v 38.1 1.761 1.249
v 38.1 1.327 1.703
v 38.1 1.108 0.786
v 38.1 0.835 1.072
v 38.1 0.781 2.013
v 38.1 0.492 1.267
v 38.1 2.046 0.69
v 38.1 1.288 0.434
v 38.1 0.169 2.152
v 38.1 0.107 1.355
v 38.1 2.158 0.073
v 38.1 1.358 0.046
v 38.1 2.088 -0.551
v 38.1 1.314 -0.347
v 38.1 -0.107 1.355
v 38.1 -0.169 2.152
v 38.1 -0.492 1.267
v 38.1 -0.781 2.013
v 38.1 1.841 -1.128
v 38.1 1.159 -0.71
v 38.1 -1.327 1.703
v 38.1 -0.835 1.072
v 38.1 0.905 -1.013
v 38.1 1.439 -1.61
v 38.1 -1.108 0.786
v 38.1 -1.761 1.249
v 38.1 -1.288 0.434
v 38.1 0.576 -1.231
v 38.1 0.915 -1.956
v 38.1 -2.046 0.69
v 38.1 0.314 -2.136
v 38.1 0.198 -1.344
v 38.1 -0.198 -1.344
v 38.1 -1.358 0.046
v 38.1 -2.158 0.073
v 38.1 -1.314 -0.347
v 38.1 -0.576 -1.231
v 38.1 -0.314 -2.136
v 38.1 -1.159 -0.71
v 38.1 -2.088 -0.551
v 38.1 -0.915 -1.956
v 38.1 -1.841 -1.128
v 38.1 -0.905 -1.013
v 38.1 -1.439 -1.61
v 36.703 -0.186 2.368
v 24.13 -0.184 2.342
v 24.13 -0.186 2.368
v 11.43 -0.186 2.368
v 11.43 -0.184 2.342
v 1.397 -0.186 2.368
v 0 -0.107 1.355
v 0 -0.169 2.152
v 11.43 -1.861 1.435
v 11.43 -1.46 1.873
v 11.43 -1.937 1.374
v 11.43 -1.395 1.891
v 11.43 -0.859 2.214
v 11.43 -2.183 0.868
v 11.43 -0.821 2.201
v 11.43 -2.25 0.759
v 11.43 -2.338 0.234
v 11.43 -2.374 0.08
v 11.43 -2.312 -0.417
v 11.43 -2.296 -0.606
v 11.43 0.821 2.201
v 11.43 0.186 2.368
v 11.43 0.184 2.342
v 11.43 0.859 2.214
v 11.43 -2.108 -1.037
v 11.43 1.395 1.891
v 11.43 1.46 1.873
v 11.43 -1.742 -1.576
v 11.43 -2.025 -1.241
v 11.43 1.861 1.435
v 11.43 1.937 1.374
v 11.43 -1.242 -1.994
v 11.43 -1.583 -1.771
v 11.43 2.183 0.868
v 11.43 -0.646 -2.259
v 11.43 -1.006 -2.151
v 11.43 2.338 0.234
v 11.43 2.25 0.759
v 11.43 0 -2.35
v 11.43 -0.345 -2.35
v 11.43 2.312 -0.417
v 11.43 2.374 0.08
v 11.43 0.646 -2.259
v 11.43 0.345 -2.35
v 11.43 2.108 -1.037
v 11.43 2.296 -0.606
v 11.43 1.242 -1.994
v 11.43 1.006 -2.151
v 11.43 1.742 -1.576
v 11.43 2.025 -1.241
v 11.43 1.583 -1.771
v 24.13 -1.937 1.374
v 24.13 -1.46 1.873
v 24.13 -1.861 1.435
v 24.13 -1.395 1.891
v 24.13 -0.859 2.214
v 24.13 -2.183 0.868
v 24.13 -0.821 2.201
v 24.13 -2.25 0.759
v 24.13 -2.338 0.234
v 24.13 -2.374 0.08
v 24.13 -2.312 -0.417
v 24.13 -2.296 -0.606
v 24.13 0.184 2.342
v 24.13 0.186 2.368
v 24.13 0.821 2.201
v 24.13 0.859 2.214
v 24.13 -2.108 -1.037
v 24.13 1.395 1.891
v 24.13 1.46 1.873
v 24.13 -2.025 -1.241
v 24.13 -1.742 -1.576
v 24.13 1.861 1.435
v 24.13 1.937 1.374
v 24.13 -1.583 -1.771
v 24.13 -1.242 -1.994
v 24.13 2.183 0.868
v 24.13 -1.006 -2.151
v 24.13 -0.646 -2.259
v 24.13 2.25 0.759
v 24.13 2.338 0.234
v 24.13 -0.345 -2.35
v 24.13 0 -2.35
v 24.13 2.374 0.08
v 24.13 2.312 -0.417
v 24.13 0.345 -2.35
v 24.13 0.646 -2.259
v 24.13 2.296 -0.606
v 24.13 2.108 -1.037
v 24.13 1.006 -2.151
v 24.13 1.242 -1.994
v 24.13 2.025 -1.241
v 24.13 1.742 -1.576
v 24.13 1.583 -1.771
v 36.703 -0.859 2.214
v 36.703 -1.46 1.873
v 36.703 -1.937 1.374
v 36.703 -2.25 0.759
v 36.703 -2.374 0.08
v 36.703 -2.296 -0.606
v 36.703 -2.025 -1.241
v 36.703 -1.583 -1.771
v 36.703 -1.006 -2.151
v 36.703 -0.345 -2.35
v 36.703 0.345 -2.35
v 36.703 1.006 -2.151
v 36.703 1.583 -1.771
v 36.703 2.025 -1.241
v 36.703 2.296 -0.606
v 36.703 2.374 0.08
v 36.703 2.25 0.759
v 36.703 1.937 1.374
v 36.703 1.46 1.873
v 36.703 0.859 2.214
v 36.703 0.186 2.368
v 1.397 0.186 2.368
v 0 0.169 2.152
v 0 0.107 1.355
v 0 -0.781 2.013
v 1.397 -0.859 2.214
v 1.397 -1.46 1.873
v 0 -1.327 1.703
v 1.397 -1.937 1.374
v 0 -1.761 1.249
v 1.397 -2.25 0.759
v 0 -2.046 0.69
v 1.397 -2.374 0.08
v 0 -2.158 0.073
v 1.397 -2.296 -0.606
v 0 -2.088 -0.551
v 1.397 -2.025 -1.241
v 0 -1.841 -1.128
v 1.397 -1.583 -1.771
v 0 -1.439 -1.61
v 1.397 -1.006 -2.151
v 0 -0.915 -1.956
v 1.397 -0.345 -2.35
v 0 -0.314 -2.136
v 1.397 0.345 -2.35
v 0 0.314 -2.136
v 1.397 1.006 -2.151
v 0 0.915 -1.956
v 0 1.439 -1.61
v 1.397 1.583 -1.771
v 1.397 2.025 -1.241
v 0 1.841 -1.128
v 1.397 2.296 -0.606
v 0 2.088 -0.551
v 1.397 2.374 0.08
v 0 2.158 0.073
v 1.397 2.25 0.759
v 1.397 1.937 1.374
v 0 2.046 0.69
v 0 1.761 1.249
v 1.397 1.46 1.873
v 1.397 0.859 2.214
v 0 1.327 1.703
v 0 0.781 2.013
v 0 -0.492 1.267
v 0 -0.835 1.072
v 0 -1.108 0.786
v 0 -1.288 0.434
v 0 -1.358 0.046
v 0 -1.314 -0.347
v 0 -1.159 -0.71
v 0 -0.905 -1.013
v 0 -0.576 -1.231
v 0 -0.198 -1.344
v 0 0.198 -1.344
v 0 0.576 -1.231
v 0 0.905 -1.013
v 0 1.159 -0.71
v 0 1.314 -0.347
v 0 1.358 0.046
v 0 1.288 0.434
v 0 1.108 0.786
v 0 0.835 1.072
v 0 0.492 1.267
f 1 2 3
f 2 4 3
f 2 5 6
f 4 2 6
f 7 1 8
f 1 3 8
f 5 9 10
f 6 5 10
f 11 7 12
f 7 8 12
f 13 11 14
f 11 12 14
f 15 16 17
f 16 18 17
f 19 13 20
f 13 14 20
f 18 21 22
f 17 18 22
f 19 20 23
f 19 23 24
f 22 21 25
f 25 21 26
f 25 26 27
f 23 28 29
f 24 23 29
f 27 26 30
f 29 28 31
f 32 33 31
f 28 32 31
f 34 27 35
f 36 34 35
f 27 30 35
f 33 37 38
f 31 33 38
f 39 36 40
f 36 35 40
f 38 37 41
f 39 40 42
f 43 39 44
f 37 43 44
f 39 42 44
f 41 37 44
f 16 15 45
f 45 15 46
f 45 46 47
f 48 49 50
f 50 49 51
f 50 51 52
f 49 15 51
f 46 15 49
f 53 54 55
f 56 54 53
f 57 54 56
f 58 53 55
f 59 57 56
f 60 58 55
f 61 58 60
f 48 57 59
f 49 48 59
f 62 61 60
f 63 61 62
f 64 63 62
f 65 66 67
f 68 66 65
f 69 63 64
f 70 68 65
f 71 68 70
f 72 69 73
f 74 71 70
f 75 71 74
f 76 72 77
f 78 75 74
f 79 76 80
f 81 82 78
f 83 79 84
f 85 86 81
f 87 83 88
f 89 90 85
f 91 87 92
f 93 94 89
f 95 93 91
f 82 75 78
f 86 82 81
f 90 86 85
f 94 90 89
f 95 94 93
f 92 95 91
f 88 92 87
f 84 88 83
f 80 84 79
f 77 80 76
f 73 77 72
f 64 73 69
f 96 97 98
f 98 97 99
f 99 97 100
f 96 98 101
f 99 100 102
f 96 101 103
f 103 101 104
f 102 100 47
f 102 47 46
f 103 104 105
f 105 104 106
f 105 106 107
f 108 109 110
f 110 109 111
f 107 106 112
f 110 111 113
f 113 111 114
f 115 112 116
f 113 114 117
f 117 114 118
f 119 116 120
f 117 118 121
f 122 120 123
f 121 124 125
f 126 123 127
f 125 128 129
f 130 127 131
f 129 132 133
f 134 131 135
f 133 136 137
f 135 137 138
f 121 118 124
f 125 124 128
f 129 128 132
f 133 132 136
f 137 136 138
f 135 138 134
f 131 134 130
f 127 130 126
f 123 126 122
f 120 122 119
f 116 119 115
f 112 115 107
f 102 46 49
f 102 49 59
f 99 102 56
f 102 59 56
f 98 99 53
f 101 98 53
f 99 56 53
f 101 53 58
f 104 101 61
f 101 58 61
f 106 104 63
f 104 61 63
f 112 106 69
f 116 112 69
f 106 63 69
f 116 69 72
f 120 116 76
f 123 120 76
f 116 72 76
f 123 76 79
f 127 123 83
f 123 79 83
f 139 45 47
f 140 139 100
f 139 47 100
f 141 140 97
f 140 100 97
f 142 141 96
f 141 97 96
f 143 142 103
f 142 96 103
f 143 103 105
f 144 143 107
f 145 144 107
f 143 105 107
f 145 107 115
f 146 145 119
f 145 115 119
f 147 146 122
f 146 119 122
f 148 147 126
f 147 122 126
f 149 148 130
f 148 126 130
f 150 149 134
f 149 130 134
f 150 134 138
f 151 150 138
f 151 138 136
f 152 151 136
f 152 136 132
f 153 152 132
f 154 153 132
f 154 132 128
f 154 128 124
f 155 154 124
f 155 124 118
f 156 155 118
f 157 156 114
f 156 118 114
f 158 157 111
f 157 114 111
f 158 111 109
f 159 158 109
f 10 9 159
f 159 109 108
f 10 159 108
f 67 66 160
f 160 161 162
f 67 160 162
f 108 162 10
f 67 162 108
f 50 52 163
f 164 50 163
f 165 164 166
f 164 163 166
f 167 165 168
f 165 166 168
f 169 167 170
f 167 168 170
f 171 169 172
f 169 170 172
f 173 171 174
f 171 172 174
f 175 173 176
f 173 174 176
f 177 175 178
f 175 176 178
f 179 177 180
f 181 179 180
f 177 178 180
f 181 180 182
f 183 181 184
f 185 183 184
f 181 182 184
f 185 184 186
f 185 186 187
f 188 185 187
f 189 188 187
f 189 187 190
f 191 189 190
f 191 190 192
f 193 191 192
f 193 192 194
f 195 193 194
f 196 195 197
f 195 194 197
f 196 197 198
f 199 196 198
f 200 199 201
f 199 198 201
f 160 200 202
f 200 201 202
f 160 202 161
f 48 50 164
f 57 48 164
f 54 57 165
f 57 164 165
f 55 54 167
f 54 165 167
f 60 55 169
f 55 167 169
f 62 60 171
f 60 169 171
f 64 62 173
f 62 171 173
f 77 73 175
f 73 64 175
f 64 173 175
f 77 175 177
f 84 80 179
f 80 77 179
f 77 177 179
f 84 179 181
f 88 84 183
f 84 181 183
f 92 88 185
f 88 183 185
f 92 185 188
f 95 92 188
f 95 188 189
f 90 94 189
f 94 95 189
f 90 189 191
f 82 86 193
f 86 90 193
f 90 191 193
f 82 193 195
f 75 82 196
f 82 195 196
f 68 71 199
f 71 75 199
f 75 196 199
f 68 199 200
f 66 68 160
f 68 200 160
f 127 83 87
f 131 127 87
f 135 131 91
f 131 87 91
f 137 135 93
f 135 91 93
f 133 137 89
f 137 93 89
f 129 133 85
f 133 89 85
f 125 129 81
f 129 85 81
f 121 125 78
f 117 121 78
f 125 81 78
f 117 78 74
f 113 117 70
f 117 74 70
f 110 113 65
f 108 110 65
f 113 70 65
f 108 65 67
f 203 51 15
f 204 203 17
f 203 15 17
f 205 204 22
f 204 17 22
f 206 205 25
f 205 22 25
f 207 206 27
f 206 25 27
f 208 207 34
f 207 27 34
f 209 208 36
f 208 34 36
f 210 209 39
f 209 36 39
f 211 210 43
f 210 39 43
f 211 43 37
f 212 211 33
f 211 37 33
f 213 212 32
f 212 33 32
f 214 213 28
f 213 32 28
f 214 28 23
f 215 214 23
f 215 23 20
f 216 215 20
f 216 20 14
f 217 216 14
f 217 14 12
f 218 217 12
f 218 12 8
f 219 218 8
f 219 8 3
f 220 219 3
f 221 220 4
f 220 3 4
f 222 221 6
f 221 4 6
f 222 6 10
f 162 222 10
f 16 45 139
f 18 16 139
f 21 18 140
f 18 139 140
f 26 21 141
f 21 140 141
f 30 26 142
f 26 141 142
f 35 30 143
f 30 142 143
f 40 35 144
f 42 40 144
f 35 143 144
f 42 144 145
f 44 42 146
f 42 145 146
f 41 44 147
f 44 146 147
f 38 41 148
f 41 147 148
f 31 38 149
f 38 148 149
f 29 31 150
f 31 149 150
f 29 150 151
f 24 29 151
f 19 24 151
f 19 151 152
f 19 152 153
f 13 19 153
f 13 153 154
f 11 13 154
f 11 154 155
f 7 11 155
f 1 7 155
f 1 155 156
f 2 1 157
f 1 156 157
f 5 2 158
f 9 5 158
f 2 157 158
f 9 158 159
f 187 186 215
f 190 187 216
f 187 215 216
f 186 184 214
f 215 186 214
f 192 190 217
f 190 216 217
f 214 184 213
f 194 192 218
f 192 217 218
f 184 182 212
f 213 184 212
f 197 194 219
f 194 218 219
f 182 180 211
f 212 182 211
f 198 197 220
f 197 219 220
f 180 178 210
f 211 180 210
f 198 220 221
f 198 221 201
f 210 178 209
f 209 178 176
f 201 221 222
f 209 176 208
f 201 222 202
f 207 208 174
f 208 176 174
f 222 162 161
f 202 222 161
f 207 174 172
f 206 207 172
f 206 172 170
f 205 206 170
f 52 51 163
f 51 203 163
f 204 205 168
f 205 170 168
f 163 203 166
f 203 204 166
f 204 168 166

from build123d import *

# Parameters (mm, degrees)
GAP_DEPTH               = 39.247748954
CUT_EXTRUDE1_DEPTH      = 6.35
CUT_EXTRUDE1_DEPTH_BACK = 6.35
SKETCH3_R               = 4.928370377
SKETCH3_R_2             = 2.3495


with BuildPart() as part:
    # Sketch1 → Base-Revolve (revolve)
    with BuildSketch(Plane.XY, mode=Mode.PRIVATE) as base_revolve_sk:
        Polygon((0, 1.3589), (38.1, 1.3589), (38.1, 2.159), (36.703, 2.3749), (1.397, 2.3749), (0, 2.159), align=None)
    revolve(base_revolve_sk.sketch.rotate(Axis((-9.525, 0, 0), (1, 0, 0)), 90), axis=Axis((-9.525, 0, 0), (1, 0, 0)))

    # Sketch2 → Gap (cut, through all)
    with BuildSketch(Plane(origin=(0, 0, 0), x_dir=(0, -1, 0), z_dir=(-1, 0, 0))):
        with BuildLine():
            Line((0, 0), (0.190059157, 2.414930555))
            ThreePointArc((0.190059157, 2.414930555), (0, 2.422398), (-0.190059157, 2.414930555))
            Line((-0.190059157, 2.414930555), (0, 0))
        make_face()
    extrude(amount=-GAP_DEPTH, mode=Mode.SUBTRACT)

    # Sketch3 → Cut-Extrude1 (cut, two sides: drawn at the far end of the back side and taken through both)
    with BuildSketch(Plane(origin=(17.78, 0, 0), x_dir=(0, 0, -1), z_dir=(1, 0, 0)).offset(-CUT_EXTRUDE1_DEPTH_BACK)):
        Circle(SKETCH3_R)
        Circle(SKETCH3_R_2, mode=Mode.SUBTRACT)
    extrude(amount=CUT_EXTRUDE1_DEPTH + CUT_EXTRUDE1_DEPTH_BACK, mode=Mode.SUBTRACT)


solid = part.part
